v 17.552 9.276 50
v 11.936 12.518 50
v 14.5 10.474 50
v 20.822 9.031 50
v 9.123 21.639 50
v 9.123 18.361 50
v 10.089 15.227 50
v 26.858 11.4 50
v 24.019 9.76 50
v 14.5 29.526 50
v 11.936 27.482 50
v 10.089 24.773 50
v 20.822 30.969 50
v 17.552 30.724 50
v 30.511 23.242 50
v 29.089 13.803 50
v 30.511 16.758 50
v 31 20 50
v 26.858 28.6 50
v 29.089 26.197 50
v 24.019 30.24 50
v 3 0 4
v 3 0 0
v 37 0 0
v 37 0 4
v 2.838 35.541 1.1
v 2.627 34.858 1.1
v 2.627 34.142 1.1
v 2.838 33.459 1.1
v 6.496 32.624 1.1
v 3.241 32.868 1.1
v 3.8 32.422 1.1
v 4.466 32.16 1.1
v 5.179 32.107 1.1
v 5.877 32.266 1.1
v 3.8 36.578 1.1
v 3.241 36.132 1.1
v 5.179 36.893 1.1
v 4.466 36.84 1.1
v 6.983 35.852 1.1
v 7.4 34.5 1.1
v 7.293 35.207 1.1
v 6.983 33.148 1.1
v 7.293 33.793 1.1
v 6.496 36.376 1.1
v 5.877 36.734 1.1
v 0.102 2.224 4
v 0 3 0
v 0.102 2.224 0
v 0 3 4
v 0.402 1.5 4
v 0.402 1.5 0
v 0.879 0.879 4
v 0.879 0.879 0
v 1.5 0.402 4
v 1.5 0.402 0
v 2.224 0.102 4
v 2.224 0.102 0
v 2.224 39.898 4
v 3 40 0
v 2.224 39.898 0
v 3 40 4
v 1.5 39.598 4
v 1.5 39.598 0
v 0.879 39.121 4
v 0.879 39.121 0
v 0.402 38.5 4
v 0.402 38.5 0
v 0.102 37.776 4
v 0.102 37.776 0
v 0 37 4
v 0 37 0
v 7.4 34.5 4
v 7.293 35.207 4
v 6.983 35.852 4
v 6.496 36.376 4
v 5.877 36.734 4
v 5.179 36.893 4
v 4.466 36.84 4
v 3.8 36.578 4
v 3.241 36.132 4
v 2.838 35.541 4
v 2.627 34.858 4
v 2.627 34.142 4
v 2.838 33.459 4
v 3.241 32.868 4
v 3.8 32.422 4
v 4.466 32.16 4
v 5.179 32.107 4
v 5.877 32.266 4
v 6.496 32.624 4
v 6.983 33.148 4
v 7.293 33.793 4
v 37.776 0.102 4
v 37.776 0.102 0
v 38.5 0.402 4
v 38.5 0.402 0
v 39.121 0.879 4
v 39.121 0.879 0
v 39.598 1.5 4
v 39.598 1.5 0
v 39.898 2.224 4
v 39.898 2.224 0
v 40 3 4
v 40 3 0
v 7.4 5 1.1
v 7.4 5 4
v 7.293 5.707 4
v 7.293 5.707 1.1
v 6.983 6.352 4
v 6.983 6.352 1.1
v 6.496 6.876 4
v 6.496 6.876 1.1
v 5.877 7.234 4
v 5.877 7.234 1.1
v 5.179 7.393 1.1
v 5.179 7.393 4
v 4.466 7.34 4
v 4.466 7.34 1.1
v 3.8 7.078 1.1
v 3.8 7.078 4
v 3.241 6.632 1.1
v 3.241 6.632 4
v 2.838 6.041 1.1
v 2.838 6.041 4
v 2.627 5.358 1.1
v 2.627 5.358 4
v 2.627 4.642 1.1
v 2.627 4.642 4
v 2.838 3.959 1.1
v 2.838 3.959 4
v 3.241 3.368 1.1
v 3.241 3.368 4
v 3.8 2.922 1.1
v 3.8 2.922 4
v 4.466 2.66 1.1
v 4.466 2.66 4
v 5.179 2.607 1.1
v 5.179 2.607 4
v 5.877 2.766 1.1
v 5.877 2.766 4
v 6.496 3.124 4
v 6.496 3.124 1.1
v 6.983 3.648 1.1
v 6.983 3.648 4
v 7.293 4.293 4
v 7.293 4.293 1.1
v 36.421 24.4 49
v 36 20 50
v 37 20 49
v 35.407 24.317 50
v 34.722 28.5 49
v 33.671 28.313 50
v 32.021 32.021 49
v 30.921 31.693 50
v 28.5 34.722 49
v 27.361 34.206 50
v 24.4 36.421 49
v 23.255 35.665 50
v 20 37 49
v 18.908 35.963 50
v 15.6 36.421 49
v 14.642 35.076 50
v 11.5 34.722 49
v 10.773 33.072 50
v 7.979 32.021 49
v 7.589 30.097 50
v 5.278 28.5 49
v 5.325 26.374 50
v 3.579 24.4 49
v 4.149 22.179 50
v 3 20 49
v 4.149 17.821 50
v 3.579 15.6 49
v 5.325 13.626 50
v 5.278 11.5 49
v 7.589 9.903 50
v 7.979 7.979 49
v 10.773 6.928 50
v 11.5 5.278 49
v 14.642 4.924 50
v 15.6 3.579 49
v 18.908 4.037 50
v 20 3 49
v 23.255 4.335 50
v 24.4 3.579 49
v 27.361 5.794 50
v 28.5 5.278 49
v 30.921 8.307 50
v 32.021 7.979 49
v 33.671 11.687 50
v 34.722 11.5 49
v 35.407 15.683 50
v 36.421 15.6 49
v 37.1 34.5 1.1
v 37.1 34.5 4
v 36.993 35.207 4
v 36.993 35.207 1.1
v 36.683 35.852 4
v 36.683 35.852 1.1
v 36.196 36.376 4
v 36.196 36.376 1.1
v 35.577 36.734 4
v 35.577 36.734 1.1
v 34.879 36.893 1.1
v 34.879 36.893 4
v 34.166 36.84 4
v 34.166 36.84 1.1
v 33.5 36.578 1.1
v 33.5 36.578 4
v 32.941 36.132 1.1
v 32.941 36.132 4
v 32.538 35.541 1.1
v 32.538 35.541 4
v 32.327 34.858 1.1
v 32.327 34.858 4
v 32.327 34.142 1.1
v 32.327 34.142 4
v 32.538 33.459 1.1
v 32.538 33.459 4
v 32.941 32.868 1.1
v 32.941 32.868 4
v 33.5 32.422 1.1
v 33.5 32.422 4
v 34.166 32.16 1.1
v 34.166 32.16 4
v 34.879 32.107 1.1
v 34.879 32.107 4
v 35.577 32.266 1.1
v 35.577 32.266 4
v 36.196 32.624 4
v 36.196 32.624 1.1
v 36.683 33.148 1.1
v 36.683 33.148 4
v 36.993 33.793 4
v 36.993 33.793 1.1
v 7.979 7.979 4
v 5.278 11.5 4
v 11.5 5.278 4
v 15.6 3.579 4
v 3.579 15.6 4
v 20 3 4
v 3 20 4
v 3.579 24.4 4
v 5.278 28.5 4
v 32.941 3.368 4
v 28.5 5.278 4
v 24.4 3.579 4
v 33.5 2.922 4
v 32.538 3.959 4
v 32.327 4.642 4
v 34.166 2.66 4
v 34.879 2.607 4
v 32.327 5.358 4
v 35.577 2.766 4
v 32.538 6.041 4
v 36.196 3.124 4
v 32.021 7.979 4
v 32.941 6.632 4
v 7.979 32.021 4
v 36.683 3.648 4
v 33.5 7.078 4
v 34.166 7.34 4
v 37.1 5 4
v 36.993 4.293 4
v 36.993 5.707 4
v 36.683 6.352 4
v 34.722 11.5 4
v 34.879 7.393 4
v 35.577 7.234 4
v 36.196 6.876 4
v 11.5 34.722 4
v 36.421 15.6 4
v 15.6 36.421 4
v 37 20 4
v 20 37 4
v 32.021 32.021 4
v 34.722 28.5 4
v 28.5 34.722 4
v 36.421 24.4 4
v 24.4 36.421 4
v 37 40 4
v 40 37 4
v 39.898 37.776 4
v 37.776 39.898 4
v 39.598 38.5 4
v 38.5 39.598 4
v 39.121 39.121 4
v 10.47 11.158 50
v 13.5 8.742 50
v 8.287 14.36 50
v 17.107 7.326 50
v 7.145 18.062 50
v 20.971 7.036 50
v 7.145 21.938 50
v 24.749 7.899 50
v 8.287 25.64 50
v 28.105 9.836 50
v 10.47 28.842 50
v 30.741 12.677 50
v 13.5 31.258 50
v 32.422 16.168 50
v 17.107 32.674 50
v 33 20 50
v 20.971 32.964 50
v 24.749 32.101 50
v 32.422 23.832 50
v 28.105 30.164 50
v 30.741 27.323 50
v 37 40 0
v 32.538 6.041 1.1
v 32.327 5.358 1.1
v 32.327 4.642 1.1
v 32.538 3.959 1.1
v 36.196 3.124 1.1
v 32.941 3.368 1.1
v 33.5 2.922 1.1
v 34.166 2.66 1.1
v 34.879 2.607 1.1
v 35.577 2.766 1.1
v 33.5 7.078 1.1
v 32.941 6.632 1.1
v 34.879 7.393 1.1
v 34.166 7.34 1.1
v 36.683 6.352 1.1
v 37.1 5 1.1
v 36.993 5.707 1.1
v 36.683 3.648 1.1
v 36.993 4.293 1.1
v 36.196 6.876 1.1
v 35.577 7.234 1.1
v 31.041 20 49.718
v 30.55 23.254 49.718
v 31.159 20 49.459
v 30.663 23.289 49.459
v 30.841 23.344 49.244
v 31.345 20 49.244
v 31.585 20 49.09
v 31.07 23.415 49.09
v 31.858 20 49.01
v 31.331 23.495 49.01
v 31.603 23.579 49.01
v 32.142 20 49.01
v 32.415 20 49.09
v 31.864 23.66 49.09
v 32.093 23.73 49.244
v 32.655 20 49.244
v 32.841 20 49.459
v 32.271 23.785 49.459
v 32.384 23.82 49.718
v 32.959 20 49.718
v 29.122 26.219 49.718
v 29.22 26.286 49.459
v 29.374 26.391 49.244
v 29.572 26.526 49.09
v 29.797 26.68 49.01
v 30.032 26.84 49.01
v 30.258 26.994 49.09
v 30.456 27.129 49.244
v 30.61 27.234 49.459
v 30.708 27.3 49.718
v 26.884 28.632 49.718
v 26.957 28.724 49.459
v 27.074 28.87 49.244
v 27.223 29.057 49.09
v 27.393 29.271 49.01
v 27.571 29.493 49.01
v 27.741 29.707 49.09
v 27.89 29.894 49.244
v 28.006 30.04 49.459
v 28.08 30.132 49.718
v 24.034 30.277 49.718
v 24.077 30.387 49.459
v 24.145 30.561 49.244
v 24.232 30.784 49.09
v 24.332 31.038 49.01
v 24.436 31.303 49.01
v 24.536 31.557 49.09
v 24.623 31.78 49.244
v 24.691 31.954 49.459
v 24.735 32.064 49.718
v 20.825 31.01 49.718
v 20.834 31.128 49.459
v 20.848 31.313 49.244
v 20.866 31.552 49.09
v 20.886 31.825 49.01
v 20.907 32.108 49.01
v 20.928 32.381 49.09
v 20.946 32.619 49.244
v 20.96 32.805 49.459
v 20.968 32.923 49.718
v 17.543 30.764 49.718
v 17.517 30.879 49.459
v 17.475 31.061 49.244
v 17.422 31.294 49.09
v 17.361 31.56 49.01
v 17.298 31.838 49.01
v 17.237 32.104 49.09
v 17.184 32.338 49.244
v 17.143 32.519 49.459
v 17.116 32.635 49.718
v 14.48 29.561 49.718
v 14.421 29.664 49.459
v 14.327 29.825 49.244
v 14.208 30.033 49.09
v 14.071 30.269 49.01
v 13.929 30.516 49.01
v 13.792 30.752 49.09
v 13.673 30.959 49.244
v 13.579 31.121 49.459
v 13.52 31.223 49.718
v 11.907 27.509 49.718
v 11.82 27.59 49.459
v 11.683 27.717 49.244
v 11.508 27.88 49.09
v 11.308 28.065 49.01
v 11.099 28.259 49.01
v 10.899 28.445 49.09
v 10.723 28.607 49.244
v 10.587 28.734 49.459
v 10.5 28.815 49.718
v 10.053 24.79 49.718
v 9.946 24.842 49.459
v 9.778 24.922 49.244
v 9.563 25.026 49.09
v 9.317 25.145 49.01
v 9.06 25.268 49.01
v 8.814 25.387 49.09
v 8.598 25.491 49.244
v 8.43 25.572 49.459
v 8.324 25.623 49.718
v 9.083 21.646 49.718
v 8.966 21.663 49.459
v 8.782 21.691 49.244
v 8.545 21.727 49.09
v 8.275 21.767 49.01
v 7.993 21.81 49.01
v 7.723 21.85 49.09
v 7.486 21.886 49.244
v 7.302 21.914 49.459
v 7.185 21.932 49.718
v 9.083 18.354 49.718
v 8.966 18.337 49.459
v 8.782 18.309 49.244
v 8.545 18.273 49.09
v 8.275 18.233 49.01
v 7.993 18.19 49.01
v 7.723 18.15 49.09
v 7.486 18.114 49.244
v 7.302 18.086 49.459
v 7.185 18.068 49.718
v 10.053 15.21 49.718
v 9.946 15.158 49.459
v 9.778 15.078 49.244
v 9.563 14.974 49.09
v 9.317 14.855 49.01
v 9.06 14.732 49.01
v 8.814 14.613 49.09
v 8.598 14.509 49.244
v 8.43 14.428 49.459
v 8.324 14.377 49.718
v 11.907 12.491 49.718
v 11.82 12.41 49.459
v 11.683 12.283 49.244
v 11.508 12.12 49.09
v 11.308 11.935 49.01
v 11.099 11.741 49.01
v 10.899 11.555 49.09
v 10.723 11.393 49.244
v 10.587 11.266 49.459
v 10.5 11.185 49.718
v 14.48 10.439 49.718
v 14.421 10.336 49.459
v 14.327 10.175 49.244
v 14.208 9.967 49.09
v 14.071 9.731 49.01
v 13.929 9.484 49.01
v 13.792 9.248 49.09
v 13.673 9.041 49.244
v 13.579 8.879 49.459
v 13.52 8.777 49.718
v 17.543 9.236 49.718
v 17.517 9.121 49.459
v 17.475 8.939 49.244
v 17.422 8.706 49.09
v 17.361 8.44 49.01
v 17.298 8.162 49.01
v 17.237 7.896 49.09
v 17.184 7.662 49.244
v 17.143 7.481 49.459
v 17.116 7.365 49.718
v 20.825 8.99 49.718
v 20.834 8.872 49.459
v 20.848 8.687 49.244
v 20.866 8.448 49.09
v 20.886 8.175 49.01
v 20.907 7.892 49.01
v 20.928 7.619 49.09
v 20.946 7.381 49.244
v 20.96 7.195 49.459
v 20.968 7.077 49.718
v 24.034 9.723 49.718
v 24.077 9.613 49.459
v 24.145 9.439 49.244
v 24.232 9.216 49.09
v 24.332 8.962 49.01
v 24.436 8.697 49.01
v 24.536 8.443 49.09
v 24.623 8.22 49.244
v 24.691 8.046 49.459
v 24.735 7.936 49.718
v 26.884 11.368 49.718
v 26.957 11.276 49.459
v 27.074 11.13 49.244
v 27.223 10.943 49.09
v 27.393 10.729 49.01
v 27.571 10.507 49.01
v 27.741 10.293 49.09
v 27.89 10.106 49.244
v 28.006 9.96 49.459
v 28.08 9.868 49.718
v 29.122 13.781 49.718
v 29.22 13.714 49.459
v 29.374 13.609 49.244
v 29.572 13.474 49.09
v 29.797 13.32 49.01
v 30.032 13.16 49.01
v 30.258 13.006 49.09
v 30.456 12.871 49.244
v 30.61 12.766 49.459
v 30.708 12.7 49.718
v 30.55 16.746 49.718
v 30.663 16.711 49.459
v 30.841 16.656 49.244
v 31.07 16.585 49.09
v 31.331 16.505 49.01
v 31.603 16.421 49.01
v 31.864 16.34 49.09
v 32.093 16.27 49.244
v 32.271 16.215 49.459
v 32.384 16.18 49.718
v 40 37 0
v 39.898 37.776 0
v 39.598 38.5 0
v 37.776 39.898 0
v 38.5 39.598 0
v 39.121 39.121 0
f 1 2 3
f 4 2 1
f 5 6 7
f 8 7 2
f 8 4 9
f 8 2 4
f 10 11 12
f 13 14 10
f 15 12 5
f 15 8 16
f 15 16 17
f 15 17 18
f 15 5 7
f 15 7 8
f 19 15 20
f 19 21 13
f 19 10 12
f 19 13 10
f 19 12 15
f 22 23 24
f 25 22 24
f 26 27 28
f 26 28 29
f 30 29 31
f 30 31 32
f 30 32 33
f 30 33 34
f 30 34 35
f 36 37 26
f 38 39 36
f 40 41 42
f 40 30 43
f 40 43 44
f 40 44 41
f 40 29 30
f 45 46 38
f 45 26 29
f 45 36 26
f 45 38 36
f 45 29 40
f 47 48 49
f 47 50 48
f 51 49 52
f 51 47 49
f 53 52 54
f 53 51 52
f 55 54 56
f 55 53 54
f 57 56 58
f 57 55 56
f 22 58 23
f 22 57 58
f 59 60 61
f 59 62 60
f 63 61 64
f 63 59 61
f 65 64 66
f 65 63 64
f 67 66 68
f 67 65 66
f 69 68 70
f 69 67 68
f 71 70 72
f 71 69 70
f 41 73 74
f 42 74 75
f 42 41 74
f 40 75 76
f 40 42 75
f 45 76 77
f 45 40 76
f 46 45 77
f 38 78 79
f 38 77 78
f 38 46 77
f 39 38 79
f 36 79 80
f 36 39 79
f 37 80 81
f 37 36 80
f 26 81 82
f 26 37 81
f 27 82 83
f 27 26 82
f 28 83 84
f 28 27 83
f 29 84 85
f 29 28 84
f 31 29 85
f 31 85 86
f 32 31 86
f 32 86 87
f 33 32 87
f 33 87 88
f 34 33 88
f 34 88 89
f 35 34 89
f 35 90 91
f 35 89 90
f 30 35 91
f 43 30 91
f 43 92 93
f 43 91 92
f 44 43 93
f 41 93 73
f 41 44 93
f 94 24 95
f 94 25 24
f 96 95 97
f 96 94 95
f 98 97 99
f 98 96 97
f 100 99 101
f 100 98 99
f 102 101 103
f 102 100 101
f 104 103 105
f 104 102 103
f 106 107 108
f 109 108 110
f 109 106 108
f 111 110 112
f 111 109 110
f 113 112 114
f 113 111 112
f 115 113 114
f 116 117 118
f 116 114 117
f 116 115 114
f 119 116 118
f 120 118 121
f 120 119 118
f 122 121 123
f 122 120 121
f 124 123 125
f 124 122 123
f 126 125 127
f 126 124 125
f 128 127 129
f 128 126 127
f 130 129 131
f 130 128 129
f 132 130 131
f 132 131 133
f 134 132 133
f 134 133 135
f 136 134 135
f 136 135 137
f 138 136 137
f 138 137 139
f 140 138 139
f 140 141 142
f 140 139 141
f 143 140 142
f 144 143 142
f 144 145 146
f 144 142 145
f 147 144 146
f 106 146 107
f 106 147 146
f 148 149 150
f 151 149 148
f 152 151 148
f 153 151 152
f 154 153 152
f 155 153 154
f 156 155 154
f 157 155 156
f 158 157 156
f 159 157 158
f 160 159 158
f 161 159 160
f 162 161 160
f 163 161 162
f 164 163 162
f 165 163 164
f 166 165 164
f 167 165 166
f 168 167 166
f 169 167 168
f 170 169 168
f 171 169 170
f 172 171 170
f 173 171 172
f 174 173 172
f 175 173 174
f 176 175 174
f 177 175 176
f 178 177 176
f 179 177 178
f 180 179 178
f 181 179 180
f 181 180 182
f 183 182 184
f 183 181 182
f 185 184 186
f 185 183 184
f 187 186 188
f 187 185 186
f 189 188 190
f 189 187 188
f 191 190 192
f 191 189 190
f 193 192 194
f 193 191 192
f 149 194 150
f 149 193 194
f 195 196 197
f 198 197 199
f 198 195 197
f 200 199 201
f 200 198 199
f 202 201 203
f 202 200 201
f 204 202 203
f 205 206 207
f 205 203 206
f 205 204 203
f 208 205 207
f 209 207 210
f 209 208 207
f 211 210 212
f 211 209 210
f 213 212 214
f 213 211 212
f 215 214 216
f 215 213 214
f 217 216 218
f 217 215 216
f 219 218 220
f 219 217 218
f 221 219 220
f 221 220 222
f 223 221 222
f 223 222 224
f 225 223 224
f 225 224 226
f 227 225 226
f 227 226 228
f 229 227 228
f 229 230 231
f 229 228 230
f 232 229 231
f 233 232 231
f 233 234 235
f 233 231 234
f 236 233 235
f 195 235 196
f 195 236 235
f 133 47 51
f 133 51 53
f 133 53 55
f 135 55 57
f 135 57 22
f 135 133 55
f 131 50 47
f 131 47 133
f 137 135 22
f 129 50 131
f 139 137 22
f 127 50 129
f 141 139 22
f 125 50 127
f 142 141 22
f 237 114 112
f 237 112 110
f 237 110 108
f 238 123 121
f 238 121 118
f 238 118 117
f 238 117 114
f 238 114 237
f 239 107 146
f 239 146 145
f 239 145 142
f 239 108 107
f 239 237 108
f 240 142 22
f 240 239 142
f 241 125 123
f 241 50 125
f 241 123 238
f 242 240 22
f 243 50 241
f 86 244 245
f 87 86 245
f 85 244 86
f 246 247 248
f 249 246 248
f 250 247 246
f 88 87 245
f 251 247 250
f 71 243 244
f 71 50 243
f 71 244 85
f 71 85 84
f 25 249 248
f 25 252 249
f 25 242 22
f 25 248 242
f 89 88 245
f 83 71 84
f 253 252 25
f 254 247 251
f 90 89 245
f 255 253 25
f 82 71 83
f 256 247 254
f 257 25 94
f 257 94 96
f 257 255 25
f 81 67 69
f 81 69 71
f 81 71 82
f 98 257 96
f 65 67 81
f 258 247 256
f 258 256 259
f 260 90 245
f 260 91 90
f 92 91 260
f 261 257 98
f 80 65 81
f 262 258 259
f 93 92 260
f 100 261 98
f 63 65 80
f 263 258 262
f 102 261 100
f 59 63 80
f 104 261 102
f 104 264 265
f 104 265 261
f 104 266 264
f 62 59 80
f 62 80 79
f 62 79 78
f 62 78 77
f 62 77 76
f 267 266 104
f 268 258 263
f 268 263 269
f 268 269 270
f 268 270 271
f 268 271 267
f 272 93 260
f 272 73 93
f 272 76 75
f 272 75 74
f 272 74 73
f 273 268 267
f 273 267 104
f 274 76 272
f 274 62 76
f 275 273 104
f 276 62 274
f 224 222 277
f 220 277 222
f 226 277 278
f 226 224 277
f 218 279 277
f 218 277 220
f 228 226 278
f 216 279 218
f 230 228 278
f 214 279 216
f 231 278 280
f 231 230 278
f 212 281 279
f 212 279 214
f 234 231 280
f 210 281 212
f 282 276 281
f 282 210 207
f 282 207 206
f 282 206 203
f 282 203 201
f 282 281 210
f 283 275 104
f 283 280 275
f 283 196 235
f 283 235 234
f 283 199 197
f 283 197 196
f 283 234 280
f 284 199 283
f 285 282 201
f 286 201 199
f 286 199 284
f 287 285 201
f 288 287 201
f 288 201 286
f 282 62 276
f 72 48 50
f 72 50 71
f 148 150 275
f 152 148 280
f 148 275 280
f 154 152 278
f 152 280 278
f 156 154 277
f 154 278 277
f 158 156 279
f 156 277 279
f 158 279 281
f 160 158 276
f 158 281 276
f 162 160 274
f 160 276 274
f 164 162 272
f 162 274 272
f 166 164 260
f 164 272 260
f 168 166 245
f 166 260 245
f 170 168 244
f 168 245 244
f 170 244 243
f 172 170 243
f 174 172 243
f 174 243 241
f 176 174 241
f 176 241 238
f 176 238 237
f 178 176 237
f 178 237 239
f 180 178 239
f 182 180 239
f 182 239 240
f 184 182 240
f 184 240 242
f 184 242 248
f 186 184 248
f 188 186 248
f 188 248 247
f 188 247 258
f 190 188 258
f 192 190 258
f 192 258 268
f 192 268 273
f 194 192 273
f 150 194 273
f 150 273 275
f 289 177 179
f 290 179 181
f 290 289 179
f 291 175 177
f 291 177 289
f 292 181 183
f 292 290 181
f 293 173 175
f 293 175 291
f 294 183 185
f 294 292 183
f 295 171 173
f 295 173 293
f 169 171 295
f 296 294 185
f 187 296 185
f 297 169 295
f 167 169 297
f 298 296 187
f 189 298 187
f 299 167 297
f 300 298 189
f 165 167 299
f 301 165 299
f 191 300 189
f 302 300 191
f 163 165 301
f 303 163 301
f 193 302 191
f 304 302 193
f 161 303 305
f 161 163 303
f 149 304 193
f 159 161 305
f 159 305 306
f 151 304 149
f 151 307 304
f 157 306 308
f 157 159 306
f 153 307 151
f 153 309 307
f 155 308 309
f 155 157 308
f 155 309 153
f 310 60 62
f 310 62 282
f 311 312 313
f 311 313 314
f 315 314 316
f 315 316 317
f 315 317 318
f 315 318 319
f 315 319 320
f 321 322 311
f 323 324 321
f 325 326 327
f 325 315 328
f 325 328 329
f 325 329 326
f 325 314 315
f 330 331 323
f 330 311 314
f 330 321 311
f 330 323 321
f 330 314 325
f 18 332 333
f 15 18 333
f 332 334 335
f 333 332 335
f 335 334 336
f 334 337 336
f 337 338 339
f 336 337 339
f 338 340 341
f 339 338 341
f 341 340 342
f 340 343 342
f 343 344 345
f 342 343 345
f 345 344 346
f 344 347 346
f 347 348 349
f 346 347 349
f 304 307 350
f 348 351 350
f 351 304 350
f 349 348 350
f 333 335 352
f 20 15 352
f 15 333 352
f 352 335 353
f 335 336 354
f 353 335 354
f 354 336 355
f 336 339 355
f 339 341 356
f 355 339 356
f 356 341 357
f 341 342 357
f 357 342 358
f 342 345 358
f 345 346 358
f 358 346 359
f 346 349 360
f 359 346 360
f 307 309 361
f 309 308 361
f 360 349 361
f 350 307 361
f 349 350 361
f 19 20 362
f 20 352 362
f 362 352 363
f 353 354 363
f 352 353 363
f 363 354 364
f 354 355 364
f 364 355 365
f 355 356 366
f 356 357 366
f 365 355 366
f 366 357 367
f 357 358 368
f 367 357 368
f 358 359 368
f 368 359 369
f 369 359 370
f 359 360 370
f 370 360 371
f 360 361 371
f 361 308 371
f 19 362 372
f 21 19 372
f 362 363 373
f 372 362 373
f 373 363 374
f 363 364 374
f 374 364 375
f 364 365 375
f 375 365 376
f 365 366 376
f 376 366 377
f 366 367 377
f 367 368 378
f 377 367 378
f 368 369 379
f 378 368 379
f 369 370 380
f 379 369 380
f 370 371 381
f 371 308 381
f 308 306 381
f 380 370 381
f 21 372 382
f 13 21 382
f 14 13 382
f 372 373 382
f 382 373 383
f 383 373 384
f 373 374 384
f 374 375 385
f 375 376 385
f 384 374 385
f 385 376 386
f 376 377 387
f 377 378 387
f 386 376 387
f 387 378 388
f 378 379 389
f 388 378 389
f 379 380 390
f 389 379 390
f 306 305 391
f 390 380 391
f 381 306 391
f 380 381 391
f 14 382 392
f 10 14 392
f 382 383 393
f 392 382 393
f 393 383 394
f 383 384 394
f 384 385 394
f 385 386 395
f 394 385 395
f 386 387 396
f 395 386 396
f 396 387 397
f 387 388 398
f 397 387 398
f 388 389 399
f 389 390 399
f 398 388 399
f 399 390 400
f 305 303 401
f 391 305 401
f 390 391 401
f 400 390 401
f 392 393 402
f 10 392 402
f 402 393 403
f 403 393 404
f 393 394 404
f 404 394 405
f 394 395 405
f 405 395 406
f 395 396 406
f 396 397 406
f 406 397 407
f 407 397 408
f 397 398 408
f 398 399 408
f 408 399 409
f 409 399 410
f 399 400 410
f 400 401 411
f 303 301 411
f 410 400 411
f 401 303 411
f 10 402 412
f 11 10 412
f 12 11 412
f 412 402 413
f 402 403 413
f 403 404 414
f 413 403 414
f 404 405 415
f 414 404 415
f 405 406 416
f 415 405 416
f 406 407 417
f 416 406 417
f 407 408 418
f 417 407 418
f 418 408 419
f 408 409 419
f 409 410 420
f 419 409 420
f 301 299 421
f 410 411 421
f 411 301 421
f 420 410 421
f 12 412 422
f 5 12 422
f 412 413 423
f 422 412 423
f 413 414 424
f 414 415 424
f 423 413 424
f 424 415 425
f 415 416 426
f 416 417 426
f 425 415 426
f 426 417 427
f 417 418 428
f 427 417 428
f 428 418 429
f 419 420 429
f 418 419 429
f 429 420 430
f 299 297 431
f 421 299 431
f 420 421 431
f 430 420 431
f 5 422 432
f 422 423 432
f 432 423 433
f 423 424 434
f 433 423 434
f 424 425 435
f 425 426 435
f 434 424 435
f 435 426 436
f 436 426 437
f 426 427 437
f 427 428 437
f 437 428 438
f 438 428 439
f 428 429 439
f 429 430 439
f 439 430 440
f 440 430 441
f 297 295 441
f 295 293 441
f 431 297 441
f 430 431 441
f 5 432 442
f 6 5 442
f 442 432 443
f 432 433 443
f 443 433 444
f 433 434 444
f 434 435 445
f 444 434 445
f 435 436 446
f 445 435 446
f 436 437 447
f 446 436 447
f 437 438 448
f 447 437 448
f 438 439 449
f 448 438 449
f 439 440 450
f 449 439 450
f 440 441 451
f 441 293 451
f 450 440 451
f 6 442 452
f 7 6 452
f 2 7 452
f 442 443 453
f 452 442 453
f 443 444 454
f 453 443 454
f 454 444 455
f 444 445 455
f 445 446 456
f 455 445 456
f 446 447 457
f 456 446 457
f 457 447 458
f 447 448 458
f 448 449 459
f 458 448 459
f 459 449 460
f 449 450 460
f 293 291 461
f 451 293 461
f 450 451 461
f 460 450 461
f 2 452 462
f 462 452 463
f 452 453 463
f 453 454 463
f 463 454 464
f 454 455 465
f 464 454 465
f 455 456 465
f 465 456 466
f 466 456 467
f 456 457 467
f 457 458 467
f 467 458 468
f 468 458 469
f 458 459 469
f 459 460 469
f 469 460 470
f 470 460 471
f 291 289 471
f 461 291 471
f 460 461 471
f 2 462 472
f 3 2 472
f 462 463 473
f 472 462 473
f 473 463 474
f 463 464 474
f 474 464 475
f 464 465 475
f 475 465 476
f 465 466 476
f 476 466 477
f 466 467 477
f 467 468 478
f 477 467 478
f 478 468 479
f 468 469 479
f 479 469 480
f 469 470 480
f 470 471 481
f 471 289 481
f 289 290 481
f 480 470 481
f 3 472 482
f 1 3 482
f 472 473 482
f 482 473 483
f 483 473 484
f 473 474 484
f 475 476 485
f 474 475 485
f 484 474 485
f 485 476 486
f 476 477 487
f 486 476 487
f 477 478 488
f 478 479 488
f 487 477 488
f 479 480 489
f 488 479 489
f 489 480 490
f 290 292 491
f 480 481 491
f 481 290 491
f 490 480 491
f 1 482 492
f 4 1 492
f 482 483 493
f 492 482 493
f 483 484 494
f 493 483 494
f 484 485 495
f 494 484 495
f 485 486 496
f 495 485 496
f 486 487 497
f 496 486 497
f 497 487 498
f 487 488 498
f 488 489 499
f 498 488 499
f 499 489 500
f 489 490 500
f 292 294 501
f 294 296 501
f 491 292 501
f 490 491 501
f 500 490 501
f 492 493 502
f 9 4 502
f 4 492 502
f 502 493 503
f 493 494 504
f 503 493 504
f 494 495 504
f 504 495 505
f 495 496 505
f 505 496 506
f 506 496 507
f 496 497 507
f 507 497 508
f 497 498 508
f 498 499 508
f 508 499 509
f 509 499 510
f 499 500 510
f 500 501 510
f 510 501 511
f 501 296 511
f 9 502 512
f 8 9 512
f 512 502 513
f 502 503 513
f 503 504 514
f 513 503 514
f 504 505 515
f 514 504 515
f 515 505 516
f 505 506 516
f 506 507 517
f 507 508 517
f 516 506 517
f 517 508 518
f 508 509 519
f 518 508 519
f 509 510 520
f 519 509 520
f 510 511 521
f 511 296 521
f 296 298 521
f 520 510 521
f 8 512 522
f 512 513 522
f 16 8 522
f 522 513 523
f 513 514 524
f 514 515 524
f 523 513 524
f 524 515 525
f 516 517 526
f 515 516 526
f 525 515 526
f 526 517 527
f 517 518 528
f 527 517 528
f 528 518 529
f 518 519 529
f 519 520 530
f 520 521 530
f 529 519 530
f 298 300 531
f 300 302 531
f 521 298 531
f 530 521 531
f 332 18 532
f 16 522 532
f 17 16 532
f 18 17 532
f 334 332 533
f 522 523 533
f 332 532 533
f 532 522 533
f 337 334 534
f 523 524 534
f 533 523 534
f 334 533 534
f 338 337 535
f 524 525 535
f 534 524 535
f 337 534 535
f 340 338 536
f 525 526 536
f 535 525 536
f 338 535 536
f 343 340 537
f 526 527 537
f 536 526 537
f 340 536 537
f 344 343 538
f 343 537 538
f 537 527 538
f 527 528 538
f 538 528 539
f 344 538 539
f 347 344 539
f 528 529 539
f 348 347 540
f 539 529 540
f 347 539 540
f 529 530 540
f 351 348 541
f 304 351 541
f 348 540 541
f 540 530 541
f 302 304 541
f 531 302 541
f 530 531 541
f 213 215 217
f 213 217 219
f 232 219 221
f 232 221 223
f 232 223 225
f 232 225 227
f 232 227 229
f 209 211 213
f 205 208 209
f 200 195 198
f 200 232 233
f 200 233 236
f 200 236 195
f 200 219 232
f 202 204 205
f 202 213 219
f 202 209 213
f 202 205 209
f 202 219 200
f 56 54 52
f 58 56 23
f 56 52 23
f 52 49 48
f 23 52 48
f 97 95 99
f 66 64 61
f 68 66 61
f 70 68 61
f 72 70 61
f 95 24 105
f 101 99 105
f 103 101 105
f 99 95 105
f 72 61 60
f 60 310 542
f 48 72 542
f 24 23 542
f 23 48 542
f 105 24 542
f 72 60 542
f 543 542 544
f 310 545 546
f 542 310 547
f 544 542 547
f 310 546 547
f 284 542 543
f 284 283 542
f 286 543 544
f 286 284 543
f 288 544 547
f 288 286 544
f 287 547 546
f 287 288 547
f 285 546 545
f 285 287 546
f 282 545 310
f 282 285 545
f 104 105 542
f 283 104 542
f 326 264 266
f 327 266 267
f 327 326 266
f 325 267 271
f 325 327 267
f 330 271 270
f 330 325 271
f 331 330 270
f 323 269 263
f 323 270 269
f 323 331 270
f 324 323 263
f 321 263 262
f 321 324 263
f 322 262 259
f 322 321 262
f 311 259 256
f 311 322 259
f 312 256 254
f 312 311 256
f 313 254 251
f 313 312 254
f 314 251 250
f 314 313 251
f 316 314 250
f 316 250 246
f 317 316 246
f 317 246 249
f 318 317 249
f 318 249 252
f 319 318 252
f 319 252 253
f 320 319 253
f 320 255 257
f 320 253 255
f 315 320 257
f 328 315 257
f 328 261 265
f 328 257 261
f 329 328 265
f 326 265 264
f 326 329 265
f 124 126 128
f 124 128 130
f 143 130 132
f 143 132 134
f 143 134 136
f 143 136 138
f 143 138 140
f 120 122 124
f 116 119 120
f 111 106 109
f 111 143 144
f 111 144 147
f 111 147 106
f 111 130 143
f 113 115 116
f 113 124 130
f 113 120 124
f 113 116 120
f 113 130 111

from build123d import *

# Parameters (mm, degrees)
TORUS_R           = 1
CYLINDER001_R     = 17
CYLINDER001_DEPTH = 50
CHAMFER_SIZE      = 1
CYLINDER_R        = 2.4
CYLINDER_DEPTH    = 3.1
ARRAY_X_COUNT     = 2
ARRAY_X_PITCH     = 29.7
ARRAY_Y_COUNT     = 2
ARRAY_Y_PITCH     = 29.5
BOX_W             = 40
BOX_H             = 40
BOX_DEPTH         = 4
FILLET_R          = 3
FILLET001_R       = 3
FILLET002_R       = 3
FILLET003_R       = 3


with BuildPart() as torus:
    # Torus → Torus (revolve)
    with BuildSketch(Plane(origin=(20, 20, 50), x_dir=(1, 0, 0), z_dir=(0, -1, 0))):
        with Locations((12, 0)):
            Circle(TORUS_R)
    revolve(axis=Axis((20, 20, 50), (0, 0, 1)))


with BuildPart() as chamfer_body:
    # Cylinder001 → Cylinder001 (new body)
    with BuildSketch(Plane(origin=(20, 20, 0), x_dir=(1, 0, 0), z_dir=(0, 0, 1))):
        Circle(CYLINDER001_R)
    extrude(amount=CYLINDER001_DEPTH)

    # Chamfer
    chamfer_edges = [chamfer_body.edges().sort_by_distance(p)[0] for p in [
        (3, 20, 50),
    ]]
    chamfer(chamfer_edges, length=CHAMFER_SIZE)


with BuildPart() as array:
    # Cylinder → Cylinder (new body)
    with BuildSketch(Plane(origin=(5, 5, 1.1), x_dir=(1, 0, 0), z_dir=(0, 0, 1))):
        Circle(CYLINDER_R)
    extrude(amount=CYLINDER_DEPTH)

    # Array X: Array ×2


with BuildPart() as array_1:
    add(array.part)
    with Locations(*[(i * ARRAY_X_PITCH, 0, 0) for i in range(1, ARRAY_X_COUNT)]):
        add(array.part)

    # Array Y: Array ×2


with BuildPart() as array_2:
    add(array_1.part)
    with Locations(*[(0, i * ARRAY_Y_PITCH, 0) for i in range(1, ARRAY_Y_COUNT)]):
        add(array_1.part)


with BuildPart() as cut001:
    # Box → Box (new body)
    with BuildSketch(Plane.XY):
        with Locations((20, 20)):
            Rectangle(BOX_W, BOX_H)
    extrude(amount=BOX_DEPTH)

    # Fillet
    fillet_edges = [cut001.edges().sort_by_distance(p)[0] for p in [
        (0, 0, 2),
    ]]
    fillet(fillet_edges, radius=FILLET_R)

    # Fillet001
    fillet001_edges = [cut001.edges().sort_by_distance(p)[0] for p in [
        (40, 0, 2),
    ]]
    fillet(fillet001_edges, radius=FILLET001_R)

    # Fillet002
    fillet002_edges = [cut001.edges().sort_by_distance(p)[0] for p in [
        (40, 40, 2),
    ]]
    fillet(fillet002_edges, radius=FILLET002_R)

    # Fillet003
    fillet003_edges = [cut001.edges().sort_by_distance(p)[0] for p in [
        (0, 40, 2),
    ]]
    fillet(fillet003_edges, radius=FILLET003_R)

    # Cut: cut Array
    add(array_2.part, mode=Mode.SUBTRACT)

    # Fusion: union Chamfer body
    add(chamfer_body.part)

    # Cut001: cut Torus
    add(torus.part, mode=Mode.SUBTRACT)


solid = cut001.part
